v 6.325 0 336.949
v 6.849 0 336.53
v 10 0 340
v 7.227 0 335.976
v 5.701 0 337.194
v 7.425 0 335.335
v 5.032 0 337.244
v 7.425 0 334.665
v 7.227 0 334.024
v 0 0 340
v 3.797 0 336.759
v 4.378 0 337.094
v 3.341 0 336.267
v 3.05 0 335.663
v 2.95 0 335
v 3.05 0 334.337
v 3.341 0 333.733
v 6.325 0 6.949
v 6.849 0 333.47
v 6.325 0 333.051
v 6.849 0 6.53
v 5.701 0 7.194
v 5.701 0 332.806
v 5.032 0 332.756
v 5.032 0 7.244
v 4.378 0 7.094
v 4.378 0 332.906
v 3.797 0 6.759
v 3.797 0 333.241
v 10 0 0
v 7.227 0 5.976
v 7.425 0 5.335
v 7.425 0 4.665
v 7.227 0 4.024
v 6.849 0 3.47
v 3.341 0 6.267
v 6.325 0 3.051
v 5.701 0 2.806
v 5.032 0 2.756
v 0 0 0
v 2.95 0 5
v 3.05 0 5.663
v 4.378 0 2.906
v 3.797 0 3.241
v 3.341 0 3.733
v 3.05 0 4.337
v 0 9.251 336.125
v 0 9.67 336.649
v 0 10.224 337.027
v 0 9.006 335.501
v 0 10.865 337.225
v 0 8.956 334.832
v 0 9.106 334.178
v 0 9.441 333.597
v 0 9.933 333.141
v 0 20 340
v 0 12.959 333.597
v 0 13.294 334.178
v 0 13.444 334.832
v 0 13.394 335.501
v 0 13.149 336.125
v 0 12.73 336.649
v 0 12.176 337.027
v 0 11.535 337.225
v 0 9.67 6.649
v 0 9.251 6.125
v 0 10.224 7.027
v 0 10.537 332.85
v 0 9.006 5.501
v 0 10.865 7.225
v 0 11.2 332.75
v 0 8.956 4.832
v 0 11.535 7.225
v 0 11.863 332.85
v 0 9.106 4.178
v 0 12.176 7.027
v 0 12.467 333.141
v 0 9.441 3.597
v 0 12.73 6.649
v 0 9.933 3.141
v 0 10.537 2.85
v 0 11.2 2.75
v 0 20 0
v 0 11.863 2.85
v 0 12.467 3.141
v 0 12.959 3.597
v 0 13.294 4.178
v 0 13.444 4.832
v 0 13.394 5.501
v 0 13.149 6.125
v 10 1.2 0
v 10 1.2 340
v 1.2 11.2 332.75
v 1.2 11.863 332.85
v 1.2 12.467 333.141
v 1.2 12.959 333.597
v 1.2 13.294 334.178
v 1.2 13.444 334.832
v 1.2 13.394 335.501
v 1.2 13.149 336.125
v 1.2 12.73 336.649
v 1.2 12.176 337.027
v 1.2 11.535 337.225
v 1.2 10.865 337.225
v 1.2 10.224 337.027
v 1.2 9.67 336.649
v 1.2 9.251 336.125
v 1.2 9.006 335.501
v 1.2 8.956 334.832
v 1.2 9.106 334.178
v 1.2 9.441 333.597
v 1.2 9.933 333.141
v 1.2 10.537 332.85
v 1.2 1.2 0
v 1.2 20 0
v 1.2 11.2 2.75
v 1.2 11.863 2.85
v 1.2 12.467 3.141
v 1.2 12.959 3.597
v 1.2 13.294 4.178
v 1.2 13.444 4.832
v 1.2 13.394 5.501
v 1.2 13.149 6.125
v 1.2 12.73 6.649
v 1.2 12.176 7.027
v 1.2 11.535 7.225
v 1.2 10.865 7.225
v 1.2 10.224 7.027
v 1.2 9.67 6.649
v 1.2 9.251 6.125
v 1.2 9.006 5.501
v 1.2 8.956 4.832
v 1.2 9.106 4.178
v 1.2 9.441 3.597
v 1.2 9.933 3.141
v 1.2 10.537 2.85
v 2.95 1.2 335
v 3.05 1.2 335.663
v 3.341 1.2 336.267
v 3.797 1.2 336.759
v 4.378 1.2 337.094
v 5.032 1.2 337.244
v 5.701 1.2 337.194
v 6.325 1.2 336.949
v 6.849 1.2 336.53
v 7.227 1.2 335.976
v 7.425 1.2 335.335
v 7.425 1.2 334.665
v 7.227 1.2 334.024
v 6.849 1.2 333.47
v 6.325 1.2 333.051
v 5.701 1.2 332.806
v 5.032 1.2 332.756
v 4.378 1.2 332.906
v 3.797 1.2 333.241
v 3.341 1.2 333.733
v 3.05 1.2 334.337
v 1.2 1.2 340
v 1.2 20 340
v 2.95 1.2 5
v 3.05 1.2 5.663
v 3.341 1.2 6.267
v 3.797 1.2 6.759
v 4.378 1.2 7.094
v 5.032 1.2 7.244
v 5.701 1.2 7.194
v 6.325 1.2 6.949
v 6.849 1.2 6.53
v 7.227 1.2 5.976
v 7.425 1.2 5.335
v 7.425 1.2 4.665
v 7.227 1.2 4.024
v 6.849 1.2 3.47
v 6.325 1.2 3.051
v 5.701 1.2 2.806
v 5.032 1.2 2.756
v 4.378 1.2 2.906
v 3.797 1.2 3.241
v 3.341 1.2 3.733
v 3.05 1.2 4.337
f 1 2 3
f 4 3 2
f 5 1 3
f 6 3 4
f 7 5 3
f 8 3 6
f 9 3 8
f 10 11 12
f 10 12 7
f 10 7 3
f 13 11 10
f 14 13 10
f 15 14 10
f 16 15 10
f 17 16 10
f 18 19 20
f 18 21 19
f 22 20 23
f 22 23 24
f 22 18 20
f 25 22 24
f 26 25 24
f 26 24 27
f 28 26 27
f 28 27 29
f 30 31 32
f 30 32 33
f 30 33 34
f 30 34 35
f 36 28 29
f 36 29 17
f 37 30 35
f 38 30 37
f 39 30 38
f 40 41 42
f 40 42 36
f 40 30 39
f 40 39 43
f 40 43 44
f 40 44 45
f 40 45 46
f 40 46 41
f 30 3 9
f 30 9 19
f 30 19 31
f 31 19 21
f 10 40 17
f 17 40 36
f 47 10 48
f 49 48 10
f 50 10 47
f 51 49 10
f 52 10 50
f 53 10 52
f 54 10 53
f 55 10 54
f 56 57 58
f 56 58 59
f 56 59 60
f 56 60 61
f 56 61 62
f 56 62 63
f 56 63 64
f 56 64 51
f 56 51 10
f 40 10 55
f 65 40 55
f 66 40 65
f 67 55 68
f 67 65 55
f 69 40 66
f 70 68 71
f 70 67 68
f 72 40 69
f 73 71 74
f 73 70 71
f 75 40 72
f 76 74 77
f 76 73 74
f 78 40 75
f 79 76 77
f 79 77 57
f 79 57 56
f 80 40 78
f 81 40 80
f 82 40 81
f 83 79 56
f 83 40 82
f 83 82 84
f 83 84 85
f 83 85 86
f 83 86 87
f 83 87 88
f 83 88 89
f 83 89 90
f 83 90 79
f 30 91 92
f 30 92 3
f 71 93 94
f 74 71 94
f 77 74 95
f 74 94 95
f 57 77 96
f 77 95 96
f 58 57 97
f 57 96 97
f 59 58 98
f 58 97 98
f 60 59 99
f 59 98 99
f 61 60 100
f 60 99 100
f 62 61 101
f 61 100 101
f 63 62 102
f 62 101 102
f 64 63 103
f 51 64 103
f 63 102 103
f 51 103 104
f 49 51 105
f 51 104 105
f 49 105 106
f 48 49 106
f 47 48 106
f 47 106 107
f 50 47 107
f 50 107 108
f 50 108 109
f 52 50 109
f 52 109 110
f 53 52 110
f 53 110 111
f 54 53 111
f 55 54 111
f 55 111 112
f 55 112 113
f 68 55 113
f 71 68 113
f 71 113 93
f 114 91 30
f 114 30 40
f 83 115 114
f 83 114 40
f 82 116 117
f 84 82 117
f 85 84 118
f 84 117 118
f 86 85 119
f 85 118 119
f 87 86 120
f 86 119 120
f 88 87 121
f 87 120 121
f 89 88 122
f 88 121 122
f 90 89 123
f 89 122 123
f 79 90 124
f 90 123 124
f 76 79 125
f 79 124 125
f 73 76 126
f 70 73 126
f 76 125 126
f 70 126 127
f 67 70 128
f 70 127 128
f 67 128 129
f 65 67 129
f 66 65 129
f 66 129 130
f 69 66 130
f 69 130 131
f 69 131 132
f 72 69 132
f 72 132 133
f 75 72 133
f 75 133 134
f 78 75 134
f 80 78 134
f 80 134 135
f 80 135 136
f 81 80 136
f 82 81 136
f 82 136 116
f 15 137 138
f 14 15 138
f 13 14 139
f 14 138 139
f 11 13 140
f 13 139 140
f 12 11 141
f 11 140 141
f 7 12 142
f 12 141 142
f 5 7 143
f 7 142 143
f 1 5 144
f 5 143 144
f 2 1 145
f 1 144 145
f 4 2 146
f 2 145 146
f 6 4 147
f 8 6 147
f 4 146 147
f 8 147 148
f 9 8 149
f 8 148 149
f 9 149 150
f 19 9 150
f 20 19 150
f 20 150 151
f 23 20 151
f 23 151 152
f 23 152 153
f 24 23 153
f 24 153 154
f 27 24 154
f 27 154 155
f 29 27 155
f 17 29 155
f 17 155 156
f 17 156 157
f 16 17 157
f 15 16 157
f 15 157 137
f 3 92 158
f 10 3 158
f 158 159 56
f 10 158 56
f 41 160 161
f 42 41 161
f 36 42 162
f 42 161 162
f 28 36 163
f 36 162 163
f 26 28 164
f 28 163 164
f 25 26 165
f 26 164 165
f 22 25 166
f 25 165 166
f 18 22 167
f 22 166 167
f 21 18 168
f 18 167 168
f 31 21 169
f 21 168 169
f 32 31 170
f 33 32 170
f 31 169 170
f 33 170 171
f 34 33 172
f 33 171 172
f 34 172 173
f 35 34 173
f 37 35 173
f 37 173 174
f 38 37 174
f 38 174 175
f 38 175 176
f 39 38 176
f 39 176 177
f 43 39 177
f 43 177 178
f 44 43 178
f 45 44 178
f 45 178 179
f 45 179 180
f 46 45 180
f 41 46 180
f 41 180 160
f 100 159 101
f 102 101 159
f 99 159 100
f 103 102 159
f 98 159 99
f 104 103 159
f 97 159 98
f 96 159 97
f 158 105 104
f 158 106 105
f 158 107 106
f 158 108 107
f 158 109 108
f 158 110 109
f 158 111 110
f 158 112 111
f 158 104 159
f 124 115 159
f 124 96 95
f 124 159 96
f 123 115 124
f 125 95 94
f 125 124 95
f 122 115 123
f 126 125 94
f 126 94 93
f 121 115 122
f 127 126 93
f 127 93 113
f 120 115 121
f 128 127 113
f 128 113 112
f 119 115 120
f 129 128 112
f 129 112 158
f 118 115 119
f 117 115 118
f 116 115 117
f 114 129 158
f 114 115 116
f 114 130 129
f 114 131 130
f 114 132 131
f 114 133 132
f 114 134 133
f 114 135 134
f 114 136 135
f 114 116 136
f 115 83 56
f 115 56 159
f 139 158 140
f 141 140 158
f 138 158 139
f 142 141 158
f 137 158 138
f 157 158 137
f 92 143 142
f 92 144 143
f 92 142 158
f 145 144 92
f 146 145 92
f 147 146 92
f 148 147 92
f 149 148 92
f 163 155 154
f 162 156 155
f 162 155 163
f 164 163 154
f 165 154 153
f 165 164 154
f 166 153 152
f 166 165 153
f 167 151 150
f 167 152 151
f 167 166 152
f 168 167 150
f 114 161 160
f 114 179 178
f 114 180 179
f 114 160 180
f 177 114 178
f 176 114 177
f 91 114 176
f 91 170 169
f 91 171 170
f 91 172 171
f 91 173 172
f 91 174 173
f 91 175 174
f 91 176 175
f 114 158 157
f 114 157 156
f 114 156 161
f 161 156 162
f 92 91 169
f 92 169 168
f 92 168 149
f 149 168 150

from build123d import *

# Parameters (mm, degrees)
EXTRUDE_1_DEPTH       = 340
HOLE_WIZARD_M41_D     = 4.5
HOLE_WIZARD_M41_DEPTH = 5
HOLE_WIZARD_M41_TIP   = 1.351936393
HOLE_WIZARD_M42_D     = 4.5
HOLE_WIZARD_M42_DEPTH = 5
HOLE_WIZARD_M42_TIP   = 1.351936393


with BuildPart() as part:
    # Эскиз1 → Бобышка-Вытянуть1 (new body)
    with BuildSketch(Plane.XY):
        Polygon((0, 0), (0, 20), (1.2, 20), (1.2, 1.2), (10, 1.2), (10, 0), align=None)
    extrude(amount=EXTRUDE_1_DEPTH)

    # Отверстие с зазором M41
    with Locations(Plane.ZY):
        with Locations((335, 11.2), (5, 11.2)):
            Hole(HOLE_WIZARD_M41_D / 2, depth=HOLE_WIZARD_M41_DEPTH)
            with Locations((0, 0, -(HOLE_WIZARD_M41_DEPTH + HOLE_WIZARD_M41_TIP / 2))):  # 118° drill point
                Cone(0, HOLE_WIZARD_M41_D / 2, HOLE_WIZARD_M41_TIP, mode=Mode.SUBTRACT)

    # Отверстие с зазором M42
    with Locations(Plane.XZ):
        with Locations((5.2, 5), (5.2, 335)):
            Hole(HOLE_WIZARD_M42_D / 2, depth=HOLE_WIZARD_M42_DEPTH)
            with Locations((0, 0, -(HOLE_WIZARD_M42_DEPTH + HOLE_WIZARD_M42_TIP / 2))):  # 118° drill point
                Cone(0, HOLE_WIZARD_M42_D / 2, HOLE_WIZARD_M42_TIP, mode=Mode.SUBTRACT)


solid = part.part
